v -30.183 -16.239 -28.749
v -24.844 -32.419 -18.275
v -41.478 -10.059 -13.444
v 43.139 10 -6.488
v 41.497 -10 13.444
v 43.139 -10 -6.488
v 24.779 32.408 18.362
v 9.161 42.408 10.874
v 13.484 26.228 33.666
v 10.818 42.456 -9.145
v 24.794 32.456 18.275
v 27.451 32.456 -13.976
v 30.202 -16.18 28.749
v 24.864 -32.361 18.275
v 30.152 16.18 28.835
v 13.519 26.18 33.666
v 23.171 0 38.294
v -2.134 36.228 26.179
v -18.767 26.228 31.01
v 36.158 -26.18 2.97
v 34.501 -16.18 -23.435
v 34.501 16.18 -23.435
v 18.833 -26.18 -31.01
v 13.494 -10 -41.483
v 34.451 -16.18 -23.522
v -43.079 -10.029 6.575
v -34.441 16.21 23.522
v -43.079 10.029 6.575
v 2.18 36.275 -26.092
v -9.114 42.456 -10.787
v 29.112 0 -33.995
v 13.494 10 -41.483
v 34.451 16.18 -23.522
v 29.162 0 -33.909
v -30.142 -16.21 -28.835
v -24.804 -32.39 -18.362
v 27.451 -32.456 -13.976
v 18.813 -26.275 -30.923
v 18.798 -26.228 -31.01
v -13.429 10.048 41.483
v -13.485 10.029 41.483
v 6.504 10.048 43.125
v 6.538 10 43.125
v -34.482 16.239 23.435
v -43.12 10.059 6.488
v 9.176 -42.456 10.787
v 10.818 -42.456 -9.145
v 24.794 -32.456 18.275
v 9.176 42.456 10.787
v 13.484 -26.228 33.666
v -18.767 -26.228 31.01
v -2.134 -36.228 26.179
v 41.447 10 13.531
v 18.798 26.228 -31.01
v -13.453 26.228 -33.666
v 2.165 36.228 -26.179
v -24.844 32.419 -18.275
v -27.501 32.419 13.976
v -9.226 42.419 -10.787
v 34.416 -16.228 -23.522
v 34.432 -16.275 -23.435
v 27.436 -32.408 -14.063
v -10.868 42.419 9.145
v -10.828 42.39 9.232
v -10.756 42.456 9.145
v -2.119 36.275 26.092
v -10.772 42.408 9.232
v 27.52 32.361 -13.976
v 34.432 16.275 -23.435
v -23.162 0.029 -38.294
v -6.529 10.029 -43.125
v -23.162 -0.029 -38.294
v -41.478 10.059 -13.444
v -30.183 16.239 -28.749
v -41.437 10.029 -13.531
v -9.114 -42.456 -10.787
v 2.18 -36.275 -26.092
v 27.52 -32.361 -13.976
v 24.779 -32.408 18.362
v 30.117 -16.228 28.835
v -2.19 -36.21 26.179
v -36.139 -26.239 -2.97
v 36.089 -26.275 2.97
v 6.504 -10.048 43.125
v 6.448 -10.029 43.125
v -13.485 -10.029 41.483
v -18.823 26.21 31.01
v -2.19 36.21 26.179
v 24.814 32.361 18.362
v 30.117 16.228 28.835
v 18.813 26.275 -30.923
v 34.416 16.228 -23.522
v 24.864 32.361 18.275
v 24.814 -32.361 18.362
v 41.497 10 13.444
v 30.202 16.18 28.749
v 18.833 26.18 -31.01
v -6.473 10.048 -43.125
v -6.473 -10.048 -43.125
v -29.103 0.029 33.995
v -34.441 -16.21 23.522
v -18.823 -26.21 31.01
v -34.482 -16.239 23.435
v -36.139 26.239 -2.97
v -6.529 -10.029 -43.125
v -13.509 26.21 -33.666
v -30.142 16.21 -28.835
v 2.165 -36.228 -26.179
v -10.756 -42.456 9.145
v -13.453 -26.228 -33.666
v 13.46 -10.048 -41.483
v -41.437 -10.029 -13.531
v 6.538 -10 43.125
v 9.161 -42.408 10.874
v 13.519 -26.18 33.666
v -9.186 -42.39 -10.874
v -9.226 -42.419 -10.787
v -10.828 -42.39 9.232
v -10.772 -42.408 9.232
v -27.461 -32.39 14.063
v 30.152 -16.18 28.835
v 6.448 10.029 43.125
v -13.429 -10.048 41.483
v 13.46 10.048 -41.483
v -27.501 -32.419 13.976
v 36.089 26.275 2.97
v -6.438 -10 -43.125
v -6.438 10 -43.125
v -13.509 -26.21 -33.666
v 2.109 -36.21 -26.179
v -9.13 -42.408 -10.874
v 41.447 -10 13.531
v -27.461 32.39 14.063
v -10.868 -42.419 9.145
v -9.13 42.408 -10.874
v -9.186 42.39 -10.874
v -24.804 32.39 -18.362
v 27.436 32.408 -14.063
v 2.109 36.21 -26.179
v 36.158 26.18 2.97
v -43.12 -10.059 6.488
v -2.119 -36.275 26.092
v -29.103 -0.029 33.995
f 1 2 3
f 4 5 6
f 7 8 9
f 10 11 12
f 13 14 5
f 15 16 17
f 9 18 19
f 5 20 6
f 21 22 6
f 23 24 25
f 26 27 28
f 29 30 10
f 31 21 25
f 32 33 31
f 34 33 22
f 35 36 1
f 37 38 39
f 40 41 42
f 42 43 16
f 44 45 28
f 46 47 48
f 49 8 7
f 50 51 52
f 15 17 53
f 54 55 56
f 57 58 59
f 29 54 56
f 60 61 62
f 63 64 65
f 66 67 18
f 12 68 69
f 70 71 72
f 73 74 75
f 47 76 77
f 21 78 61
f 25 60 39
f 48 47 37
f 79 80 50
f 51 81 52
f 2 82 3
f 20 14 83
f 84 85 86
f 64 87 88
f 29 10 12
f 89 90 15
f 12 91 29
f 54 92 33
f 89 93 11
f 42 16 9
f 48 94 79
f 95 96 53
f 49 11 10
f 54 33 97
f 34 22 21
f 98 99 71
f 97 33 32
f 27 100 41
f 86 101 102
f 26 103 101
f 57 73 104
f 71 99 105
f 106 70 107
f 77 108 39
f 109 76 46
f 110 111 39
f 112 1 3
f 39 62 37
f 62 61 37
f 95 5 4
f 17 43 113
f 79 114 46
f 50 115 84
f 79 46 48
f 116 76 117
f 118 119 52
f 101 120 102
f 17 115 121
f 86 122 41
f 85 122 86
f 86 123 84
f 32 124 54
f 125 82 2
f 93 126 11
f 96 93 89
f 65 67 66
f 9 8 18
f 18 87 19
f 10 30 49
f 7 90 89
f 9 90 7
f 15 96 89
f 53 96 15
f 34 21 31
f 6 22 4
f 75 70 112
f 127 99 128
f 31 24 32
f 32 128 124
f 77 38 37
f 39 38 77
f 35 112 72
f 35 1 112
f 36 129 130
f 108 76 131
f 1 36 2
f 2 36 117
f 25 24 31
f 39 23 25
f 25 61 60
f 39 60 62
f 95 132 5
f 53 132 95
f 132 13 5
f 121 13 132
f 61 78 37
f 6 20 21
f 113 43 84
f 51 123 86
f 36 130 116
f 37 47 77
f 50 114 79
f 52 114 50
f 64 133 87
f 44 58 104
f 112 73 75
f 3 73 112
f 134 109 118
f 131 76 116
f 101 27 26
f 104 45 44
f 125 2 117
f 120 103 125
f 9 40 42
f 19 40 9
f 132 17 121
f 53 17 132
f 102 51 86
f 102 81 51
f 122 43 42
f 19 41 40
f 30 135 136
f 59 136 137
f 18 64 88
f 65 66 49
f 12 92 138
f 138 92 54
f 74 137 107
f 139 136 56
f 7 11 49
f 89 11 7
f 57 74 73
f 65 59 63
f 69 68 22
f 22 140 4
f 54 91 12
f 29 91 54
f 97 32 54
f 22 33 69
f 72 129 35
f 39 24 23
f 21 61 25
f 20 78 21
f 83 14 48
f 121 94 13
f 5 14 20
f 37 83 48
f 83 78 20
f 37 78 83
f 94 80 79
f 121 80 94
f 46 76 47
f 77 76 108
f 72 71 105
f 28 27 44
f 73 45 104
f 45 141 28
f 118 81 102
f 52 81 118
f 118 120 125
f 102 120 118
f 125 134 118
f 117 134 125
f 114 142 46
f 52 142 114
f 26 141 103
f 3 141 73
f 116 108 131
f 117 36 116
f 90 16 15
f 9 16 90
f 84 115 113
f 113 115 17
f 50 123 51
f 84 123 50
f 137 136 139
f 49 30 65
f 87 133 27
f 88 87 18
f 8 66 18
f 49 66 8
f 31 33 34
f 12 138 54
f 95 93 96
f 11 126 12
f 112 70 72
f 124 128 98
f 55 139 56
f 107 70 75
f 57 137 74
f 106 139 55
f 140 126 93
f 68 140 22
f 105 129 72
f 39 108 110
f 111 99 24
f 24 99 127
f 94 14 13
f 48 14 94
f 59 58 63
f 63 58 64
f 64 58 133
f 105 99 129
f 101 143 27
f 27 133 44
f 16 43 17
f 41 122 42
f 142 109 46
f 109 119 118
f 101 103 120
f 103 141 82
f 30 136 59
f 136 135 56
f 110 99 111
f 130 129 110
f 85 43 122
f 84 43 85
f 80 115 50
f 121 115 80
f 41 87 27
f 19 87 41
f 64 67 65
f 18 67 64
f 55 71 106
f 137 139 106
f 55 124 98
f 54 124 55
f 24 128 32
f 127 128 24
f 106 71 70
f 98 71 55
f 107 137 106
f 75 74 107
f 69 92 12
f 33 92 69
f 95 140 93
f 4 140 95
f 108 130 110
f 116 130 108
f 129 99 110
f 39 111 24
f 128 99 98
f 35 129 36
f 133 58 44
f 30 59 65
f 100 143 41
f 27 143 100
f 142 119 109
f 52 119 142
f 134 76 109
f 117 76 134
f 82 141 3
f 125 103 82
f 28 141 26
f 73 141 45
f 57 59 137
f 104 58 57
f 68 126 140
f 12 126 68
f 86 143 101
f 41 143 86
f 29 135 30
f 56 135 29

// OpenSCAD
// Auto-generated OpenSCAD file

    inner_points = 10*[[-2.742038867177172, -3.2360679774977785, 1.3976261323767254], [1.3468844323292, -2.6180339887515993, 3.357986341498399], [1.078725744059259, -4.236067977500516, -0.9145221534209236], [-3.4400881368214824, -1.6180339887474766, 2.34350838107253], [3.010197555441782, -1.6180339887528834, 2.8748823625414497], [0.21494529068553755, -3.6180339887496102, -2.6091953718079175], [-3.6058193205508937, -2.618033988746873, -0.2970470860102683], [0.6488351626848895, -1.0000000000012967, 4.303868590194203], [2.7420388671718414, -3.236067977501801, -1.397626132377872], [4.303868590195204, 0.9999999999965696, -0.6488351626855361], [-2.3121482857974716, 2.58042528973711e-12, -3.820764611237254], [-1.87825841379812, 2.6180339887508937, 3.0922993507648657], [3.4400881368214824, 1.6180339887474757, -2.34350838107253], [-3.010197555441782, 1.6180339887528825, -2.8748823625414497], [-0.2149452906855376, 3.6180339887496094, 2.6091953718079175], [3.6058193205508937, 2.618033988746872, 0.2970470860102683], [-0.6488351626848895, 1.0000000000012959, -4.303868590194203], [-2.7420388671718414, 3.2360679775018, 1.397626132377872], [-4.303868590195204, -0.9999999999965705, 0.6488351626855361], [2.3121482857974716, -2.581223596350168e-12, 3.820764611237254], [1.87825841379812, -2.6180339887508945, -3.0922993507648657], [2.742038867177172, 3.2360679774977776, -1.3976261323767254], [-1.3468844323292, 2.6180339887515984, -3.357986341498399], [-1.078725744059259, 4.236067977500516, 0.9145221534209236], [-1.0787257440662363, -4.236067977499063, 0.914522153419423], [-0.21494529069149773, -3.61803398875018, 2.609195371806636], [0.9145221534166842, -4.236067977500733, 1.0787257440619977], [-2.906242457817081, 1.7928330760680236e-12, 3.3908740298602202], [4.139664999550982, -1.000000000003648, 1.3444127347970307], [-1.3468844323335123, -2.618033988748191, -3.357986341499326], [-2.4763518764427124, -3.236067977497427, -1.8275167137549067], [-1.344412734798032, -0.9999999999996261, 4.139664999551628], [3.6058193205465807, -2.6180339887529183, 0.29704708600934127], [4.303868590193557, -1.0000000000034301, -0.6488351626858904], [-3.0101975554444476, -1.6180339887469068, -2.8748823625420235], [-1.3444127347963843, 1.0000000000003737, 4.139664999551982], [2.906242457817081, -1.7936313826810821e-12, -3.3908740298602202], [-4.139664999550982, 1.000000000003647, -1.3444127347970307], [1.3468844323335123, 2.61803398874819, 3.357986341499326], [2.4763518764427124, 3.236067977497426, 1.8275167137549067], [1.344412734798032, 0.9999999999996252, -4.139664999551628], [-3.6058193205465807, 2.6180339887529174, -0.29704708600934127], [-4.303868590193557, 1.0000000000034293, 0.6488351626858904], [3.0101975554444476, 1.618033988746906, 2.8748823625420235], [1.3444127347963843, -1.0000000000003746, -4.139664999551982], [1.0787257440662363, 4.236067977499063, -0.914522153419423], [0.21494529069149768, 3.618033988750179, -2.609195371806636], [-0.9145221534166842, 4.236067977500733, -1.0787257440619977], [-0.9145221534236627, -4.236067977498845, -1.0787257440634979], [-1.878258413802432, -2.6180339887488953, 3.0922993507639385], [2.4763518764373815, -3.2360679775021532, 1.82751671375376], [-3.4400881368188174, 1.6180339887523125, 2.343508381073103], [4.139664999552629, 0.9999999999963518, 1.344412734797385], [-0.648835162686537, -0.9999999999987038, -4.303868590194557], [3.4400881368188174, -1.6180339887523134, -2.343508381073103], [-4.139664999552629, -0.9999999999963527, -1.344412734797385], [0.648835162686537, 0.9999999999987029, 4.303868590194557], [0.9145221534236627, 4.236067977498845, 1.0787257440634979], [1.878258413802432, 2.6180339887488944, -3.0922993507639385], [-2.4763518764373815, 3.2360679775021524, -1.82751671375376]];

    outer_points = 10*[[1.3003942993482211, -4.236067977500603, -0.5558548967273335], [4.303868590193681, -1.000000000003447, 0.6488351626850386], [2.505084358762057, -1.0000000000008138, -3.559329187569369], [0.555854896722851, -4.236067977500603, 1.3003942993501374], [4.303868590195192, 0.999999999996553, 0.6488351626856443], [0.6488351626845862, -0.9999999999991863, -4.303868590194739], [-0.5558548967292495, -4.236067977498976, -1.3003942993527038], [3.559329187568311, -1.000000000003447, 2.5050843587625096], [2.5050843587635674, 0.9999999999991863, -3.559329187568763], [1.3003942993546196, 4.236067977498976, -0.5558548967247671], [-3.5593291875698214, -0.999999999996553, -2.5050843587631153], [-0.6488351626860966, -1.0000000000008138, 4.303868590194133], [-0.555854896722851, 4.236067977500603, -1.3003942993501374], [-4.303868590195192, -0.999999999996553, -0.6488351626856443], [-0.6488351626845862, 0.9999999999991863, 4.303868590194739], [0.5558548967292495, 4.236067977498976, 1.3003942993527038], [-3.559329187568311, 1.000000000003447, -2.5050843587625096], [-2.5050843587635674, -0.9999999999991863, 3.559329187568763], [-1.3003942993546196, -4.236067977498976, 0.5558548967247671], [3.5593291875698214, 0.999999999996553, 2.5050843587631153], [0.6488351626860966, 1.0000000000008138, -4.303868590194133], [-1.3003942993482211, 4.236067977500603, 0.5558548967273335], [-4.303868590193681, 1.000000000003447, -0.6488351626850386], [-2.505084358762057, 1.0000000000008138, 3.559329187569369], [2.476351876437445, -3.2360679775011065, -1.8275167137555277], [3.6058193205467344, -2.6180339887525284, -0.2970470860109091], [3.634551802870413, -1.6180339887520252, -2.0288595598251247], [0.527122414400683, -3.2360679775011065, 3.032206773164959], [3.6058193205506885, 2.6180339887472615, -0.29704708600932306], [-1.2251716840500737, -1.6180339887477646, -3.9780890218618867], [-0.5271224144055708, -3.236067977498473, -3.0322067731669193], [2.4011292611353428, -2.6180339887525284, 2.7064272048321065], [3.634551802872857, 1.6180339887477646, -2.0288595598241446], [2.476351876442333, 3.236067977498473, -1.8275167137535673], [-2.401129261139297, -2.6180339887472615, -2.706427204833693], [1.2251716840476294, -1.6180339887520252, 3.9780890218609066], [-0.527122414400683, 3.2360679775011065, -3.032206773164959], [-3.6058193205506885, -2.6180339887472615, 0.29704708600932306], [1.2251716840500737, 1.6180339887477646, 3.9780890218618867], [0.5271224144055708, 3.236067977498473, 3.0322067731669193], [-2.4011292611353428, 2.6180339887525284, -2.7064272048321065], [-3.634551802872857, -1.6180339887477646, 2.0288595598241446], [-2.476351876442333, -3.236067977498473, 1.8275167137535673], [2.401129261139297, 2.6180339887472615, 2.706427204833693], [-1.2251716840476294, 1.6180339887520252, -3.9780890218609066], [-2.476351876437445, 3.2360679775011065, 1.8275167137555277], [-3.6058193205467344, 2.6180339887525284, 0.2970470860109091], [-3.634551802870413, 1.6180339887520252, 2.0288595598251247], [1.3468844323290887, -2.618033988749895, -3.357986341499772], [2.4298617434575105, -3.618033988752025, 0.9746147310172849], [4.33260107251736, -2.9441109191035486e-12, -1.0829773111291774], [-1.3468844323330433, -2.618033988749895, 3.3579863414981856], [2.429861743462976, 3.6180339887477646, 0.974614731019477], [-2.383371610480598, 2.9441109191035486e-12, -3.7767461757913097], [1.3468844323330433, 2.618033988749895, -3.3579863414981856], [-2.429861743462976, -3.6180339887477646, -0.974614731019477], [2.383371610480598, -2.9441109191035486e-12, 3.7767461757913097], [-1.3468844323290887, 2.618033988749895, 3.357986341499772], [-2.4298617434575105, 3.618033988752025, -0.9746147310172849], [-4.33260107251736, 2.9441109191035486e-12, 1.0829773111291774]];

    // Convex hull for inner set (I)
    module inner_hull() {
        hull() {
            for (p = inner_points) {
                translate(p) sphere(r=0.1);
            }
        }
    }

    // Convex hull for outer set (O) minus inner hull (O \ I)
    module outer_minus_inner() {
        difference() {
            hull() {
                for (p = outer_points) {
                    translate(p) sphere(r=0.1);
                }
            }
            inner_hull(); // Subtract inner hull
        }
    }

    // Convex hull for outer set (O) minus all translated inner hulls
    module outer_minus_AllTranslationInner() {
        difference() {
            hull() {
                for (p = outer_points) {
                    translate(p) sphere(r=0.1);
                }
            }
            hull() {
                translate([0,0,5]) inner_hull();
                translate([0,0,-5]) inner_hull();
            }; // Subtract translated inner hulls
        }
    }

    // Difference between outer_minus_inner and outer_minus_AllTranslationInner
    module outer_minus_inner_diff() {
        difference() {
            // Outer minus inner
            difference() {
                hull() {
                    for (p = outer_points) {
                        translate(p) sphere(r=0.1);
                    }
                }
                inner_hull();
            }

            // Subtract Outer minus AllTranslationInner
            difference() {
                hull() {
                    for (p = outer_points) {
                        translate(p) sphere(r=0.1);
                    }
                }
                hull() {
                    translate([0,0,5]) inner_hull();
                    translate([0,0,-5]) inner_hull();
                };
            }
        }
    }

    // Rendering all with colors applied
    color([1, 0, 0, 0.5]) inner_hull(); // Transparent red
    
    
